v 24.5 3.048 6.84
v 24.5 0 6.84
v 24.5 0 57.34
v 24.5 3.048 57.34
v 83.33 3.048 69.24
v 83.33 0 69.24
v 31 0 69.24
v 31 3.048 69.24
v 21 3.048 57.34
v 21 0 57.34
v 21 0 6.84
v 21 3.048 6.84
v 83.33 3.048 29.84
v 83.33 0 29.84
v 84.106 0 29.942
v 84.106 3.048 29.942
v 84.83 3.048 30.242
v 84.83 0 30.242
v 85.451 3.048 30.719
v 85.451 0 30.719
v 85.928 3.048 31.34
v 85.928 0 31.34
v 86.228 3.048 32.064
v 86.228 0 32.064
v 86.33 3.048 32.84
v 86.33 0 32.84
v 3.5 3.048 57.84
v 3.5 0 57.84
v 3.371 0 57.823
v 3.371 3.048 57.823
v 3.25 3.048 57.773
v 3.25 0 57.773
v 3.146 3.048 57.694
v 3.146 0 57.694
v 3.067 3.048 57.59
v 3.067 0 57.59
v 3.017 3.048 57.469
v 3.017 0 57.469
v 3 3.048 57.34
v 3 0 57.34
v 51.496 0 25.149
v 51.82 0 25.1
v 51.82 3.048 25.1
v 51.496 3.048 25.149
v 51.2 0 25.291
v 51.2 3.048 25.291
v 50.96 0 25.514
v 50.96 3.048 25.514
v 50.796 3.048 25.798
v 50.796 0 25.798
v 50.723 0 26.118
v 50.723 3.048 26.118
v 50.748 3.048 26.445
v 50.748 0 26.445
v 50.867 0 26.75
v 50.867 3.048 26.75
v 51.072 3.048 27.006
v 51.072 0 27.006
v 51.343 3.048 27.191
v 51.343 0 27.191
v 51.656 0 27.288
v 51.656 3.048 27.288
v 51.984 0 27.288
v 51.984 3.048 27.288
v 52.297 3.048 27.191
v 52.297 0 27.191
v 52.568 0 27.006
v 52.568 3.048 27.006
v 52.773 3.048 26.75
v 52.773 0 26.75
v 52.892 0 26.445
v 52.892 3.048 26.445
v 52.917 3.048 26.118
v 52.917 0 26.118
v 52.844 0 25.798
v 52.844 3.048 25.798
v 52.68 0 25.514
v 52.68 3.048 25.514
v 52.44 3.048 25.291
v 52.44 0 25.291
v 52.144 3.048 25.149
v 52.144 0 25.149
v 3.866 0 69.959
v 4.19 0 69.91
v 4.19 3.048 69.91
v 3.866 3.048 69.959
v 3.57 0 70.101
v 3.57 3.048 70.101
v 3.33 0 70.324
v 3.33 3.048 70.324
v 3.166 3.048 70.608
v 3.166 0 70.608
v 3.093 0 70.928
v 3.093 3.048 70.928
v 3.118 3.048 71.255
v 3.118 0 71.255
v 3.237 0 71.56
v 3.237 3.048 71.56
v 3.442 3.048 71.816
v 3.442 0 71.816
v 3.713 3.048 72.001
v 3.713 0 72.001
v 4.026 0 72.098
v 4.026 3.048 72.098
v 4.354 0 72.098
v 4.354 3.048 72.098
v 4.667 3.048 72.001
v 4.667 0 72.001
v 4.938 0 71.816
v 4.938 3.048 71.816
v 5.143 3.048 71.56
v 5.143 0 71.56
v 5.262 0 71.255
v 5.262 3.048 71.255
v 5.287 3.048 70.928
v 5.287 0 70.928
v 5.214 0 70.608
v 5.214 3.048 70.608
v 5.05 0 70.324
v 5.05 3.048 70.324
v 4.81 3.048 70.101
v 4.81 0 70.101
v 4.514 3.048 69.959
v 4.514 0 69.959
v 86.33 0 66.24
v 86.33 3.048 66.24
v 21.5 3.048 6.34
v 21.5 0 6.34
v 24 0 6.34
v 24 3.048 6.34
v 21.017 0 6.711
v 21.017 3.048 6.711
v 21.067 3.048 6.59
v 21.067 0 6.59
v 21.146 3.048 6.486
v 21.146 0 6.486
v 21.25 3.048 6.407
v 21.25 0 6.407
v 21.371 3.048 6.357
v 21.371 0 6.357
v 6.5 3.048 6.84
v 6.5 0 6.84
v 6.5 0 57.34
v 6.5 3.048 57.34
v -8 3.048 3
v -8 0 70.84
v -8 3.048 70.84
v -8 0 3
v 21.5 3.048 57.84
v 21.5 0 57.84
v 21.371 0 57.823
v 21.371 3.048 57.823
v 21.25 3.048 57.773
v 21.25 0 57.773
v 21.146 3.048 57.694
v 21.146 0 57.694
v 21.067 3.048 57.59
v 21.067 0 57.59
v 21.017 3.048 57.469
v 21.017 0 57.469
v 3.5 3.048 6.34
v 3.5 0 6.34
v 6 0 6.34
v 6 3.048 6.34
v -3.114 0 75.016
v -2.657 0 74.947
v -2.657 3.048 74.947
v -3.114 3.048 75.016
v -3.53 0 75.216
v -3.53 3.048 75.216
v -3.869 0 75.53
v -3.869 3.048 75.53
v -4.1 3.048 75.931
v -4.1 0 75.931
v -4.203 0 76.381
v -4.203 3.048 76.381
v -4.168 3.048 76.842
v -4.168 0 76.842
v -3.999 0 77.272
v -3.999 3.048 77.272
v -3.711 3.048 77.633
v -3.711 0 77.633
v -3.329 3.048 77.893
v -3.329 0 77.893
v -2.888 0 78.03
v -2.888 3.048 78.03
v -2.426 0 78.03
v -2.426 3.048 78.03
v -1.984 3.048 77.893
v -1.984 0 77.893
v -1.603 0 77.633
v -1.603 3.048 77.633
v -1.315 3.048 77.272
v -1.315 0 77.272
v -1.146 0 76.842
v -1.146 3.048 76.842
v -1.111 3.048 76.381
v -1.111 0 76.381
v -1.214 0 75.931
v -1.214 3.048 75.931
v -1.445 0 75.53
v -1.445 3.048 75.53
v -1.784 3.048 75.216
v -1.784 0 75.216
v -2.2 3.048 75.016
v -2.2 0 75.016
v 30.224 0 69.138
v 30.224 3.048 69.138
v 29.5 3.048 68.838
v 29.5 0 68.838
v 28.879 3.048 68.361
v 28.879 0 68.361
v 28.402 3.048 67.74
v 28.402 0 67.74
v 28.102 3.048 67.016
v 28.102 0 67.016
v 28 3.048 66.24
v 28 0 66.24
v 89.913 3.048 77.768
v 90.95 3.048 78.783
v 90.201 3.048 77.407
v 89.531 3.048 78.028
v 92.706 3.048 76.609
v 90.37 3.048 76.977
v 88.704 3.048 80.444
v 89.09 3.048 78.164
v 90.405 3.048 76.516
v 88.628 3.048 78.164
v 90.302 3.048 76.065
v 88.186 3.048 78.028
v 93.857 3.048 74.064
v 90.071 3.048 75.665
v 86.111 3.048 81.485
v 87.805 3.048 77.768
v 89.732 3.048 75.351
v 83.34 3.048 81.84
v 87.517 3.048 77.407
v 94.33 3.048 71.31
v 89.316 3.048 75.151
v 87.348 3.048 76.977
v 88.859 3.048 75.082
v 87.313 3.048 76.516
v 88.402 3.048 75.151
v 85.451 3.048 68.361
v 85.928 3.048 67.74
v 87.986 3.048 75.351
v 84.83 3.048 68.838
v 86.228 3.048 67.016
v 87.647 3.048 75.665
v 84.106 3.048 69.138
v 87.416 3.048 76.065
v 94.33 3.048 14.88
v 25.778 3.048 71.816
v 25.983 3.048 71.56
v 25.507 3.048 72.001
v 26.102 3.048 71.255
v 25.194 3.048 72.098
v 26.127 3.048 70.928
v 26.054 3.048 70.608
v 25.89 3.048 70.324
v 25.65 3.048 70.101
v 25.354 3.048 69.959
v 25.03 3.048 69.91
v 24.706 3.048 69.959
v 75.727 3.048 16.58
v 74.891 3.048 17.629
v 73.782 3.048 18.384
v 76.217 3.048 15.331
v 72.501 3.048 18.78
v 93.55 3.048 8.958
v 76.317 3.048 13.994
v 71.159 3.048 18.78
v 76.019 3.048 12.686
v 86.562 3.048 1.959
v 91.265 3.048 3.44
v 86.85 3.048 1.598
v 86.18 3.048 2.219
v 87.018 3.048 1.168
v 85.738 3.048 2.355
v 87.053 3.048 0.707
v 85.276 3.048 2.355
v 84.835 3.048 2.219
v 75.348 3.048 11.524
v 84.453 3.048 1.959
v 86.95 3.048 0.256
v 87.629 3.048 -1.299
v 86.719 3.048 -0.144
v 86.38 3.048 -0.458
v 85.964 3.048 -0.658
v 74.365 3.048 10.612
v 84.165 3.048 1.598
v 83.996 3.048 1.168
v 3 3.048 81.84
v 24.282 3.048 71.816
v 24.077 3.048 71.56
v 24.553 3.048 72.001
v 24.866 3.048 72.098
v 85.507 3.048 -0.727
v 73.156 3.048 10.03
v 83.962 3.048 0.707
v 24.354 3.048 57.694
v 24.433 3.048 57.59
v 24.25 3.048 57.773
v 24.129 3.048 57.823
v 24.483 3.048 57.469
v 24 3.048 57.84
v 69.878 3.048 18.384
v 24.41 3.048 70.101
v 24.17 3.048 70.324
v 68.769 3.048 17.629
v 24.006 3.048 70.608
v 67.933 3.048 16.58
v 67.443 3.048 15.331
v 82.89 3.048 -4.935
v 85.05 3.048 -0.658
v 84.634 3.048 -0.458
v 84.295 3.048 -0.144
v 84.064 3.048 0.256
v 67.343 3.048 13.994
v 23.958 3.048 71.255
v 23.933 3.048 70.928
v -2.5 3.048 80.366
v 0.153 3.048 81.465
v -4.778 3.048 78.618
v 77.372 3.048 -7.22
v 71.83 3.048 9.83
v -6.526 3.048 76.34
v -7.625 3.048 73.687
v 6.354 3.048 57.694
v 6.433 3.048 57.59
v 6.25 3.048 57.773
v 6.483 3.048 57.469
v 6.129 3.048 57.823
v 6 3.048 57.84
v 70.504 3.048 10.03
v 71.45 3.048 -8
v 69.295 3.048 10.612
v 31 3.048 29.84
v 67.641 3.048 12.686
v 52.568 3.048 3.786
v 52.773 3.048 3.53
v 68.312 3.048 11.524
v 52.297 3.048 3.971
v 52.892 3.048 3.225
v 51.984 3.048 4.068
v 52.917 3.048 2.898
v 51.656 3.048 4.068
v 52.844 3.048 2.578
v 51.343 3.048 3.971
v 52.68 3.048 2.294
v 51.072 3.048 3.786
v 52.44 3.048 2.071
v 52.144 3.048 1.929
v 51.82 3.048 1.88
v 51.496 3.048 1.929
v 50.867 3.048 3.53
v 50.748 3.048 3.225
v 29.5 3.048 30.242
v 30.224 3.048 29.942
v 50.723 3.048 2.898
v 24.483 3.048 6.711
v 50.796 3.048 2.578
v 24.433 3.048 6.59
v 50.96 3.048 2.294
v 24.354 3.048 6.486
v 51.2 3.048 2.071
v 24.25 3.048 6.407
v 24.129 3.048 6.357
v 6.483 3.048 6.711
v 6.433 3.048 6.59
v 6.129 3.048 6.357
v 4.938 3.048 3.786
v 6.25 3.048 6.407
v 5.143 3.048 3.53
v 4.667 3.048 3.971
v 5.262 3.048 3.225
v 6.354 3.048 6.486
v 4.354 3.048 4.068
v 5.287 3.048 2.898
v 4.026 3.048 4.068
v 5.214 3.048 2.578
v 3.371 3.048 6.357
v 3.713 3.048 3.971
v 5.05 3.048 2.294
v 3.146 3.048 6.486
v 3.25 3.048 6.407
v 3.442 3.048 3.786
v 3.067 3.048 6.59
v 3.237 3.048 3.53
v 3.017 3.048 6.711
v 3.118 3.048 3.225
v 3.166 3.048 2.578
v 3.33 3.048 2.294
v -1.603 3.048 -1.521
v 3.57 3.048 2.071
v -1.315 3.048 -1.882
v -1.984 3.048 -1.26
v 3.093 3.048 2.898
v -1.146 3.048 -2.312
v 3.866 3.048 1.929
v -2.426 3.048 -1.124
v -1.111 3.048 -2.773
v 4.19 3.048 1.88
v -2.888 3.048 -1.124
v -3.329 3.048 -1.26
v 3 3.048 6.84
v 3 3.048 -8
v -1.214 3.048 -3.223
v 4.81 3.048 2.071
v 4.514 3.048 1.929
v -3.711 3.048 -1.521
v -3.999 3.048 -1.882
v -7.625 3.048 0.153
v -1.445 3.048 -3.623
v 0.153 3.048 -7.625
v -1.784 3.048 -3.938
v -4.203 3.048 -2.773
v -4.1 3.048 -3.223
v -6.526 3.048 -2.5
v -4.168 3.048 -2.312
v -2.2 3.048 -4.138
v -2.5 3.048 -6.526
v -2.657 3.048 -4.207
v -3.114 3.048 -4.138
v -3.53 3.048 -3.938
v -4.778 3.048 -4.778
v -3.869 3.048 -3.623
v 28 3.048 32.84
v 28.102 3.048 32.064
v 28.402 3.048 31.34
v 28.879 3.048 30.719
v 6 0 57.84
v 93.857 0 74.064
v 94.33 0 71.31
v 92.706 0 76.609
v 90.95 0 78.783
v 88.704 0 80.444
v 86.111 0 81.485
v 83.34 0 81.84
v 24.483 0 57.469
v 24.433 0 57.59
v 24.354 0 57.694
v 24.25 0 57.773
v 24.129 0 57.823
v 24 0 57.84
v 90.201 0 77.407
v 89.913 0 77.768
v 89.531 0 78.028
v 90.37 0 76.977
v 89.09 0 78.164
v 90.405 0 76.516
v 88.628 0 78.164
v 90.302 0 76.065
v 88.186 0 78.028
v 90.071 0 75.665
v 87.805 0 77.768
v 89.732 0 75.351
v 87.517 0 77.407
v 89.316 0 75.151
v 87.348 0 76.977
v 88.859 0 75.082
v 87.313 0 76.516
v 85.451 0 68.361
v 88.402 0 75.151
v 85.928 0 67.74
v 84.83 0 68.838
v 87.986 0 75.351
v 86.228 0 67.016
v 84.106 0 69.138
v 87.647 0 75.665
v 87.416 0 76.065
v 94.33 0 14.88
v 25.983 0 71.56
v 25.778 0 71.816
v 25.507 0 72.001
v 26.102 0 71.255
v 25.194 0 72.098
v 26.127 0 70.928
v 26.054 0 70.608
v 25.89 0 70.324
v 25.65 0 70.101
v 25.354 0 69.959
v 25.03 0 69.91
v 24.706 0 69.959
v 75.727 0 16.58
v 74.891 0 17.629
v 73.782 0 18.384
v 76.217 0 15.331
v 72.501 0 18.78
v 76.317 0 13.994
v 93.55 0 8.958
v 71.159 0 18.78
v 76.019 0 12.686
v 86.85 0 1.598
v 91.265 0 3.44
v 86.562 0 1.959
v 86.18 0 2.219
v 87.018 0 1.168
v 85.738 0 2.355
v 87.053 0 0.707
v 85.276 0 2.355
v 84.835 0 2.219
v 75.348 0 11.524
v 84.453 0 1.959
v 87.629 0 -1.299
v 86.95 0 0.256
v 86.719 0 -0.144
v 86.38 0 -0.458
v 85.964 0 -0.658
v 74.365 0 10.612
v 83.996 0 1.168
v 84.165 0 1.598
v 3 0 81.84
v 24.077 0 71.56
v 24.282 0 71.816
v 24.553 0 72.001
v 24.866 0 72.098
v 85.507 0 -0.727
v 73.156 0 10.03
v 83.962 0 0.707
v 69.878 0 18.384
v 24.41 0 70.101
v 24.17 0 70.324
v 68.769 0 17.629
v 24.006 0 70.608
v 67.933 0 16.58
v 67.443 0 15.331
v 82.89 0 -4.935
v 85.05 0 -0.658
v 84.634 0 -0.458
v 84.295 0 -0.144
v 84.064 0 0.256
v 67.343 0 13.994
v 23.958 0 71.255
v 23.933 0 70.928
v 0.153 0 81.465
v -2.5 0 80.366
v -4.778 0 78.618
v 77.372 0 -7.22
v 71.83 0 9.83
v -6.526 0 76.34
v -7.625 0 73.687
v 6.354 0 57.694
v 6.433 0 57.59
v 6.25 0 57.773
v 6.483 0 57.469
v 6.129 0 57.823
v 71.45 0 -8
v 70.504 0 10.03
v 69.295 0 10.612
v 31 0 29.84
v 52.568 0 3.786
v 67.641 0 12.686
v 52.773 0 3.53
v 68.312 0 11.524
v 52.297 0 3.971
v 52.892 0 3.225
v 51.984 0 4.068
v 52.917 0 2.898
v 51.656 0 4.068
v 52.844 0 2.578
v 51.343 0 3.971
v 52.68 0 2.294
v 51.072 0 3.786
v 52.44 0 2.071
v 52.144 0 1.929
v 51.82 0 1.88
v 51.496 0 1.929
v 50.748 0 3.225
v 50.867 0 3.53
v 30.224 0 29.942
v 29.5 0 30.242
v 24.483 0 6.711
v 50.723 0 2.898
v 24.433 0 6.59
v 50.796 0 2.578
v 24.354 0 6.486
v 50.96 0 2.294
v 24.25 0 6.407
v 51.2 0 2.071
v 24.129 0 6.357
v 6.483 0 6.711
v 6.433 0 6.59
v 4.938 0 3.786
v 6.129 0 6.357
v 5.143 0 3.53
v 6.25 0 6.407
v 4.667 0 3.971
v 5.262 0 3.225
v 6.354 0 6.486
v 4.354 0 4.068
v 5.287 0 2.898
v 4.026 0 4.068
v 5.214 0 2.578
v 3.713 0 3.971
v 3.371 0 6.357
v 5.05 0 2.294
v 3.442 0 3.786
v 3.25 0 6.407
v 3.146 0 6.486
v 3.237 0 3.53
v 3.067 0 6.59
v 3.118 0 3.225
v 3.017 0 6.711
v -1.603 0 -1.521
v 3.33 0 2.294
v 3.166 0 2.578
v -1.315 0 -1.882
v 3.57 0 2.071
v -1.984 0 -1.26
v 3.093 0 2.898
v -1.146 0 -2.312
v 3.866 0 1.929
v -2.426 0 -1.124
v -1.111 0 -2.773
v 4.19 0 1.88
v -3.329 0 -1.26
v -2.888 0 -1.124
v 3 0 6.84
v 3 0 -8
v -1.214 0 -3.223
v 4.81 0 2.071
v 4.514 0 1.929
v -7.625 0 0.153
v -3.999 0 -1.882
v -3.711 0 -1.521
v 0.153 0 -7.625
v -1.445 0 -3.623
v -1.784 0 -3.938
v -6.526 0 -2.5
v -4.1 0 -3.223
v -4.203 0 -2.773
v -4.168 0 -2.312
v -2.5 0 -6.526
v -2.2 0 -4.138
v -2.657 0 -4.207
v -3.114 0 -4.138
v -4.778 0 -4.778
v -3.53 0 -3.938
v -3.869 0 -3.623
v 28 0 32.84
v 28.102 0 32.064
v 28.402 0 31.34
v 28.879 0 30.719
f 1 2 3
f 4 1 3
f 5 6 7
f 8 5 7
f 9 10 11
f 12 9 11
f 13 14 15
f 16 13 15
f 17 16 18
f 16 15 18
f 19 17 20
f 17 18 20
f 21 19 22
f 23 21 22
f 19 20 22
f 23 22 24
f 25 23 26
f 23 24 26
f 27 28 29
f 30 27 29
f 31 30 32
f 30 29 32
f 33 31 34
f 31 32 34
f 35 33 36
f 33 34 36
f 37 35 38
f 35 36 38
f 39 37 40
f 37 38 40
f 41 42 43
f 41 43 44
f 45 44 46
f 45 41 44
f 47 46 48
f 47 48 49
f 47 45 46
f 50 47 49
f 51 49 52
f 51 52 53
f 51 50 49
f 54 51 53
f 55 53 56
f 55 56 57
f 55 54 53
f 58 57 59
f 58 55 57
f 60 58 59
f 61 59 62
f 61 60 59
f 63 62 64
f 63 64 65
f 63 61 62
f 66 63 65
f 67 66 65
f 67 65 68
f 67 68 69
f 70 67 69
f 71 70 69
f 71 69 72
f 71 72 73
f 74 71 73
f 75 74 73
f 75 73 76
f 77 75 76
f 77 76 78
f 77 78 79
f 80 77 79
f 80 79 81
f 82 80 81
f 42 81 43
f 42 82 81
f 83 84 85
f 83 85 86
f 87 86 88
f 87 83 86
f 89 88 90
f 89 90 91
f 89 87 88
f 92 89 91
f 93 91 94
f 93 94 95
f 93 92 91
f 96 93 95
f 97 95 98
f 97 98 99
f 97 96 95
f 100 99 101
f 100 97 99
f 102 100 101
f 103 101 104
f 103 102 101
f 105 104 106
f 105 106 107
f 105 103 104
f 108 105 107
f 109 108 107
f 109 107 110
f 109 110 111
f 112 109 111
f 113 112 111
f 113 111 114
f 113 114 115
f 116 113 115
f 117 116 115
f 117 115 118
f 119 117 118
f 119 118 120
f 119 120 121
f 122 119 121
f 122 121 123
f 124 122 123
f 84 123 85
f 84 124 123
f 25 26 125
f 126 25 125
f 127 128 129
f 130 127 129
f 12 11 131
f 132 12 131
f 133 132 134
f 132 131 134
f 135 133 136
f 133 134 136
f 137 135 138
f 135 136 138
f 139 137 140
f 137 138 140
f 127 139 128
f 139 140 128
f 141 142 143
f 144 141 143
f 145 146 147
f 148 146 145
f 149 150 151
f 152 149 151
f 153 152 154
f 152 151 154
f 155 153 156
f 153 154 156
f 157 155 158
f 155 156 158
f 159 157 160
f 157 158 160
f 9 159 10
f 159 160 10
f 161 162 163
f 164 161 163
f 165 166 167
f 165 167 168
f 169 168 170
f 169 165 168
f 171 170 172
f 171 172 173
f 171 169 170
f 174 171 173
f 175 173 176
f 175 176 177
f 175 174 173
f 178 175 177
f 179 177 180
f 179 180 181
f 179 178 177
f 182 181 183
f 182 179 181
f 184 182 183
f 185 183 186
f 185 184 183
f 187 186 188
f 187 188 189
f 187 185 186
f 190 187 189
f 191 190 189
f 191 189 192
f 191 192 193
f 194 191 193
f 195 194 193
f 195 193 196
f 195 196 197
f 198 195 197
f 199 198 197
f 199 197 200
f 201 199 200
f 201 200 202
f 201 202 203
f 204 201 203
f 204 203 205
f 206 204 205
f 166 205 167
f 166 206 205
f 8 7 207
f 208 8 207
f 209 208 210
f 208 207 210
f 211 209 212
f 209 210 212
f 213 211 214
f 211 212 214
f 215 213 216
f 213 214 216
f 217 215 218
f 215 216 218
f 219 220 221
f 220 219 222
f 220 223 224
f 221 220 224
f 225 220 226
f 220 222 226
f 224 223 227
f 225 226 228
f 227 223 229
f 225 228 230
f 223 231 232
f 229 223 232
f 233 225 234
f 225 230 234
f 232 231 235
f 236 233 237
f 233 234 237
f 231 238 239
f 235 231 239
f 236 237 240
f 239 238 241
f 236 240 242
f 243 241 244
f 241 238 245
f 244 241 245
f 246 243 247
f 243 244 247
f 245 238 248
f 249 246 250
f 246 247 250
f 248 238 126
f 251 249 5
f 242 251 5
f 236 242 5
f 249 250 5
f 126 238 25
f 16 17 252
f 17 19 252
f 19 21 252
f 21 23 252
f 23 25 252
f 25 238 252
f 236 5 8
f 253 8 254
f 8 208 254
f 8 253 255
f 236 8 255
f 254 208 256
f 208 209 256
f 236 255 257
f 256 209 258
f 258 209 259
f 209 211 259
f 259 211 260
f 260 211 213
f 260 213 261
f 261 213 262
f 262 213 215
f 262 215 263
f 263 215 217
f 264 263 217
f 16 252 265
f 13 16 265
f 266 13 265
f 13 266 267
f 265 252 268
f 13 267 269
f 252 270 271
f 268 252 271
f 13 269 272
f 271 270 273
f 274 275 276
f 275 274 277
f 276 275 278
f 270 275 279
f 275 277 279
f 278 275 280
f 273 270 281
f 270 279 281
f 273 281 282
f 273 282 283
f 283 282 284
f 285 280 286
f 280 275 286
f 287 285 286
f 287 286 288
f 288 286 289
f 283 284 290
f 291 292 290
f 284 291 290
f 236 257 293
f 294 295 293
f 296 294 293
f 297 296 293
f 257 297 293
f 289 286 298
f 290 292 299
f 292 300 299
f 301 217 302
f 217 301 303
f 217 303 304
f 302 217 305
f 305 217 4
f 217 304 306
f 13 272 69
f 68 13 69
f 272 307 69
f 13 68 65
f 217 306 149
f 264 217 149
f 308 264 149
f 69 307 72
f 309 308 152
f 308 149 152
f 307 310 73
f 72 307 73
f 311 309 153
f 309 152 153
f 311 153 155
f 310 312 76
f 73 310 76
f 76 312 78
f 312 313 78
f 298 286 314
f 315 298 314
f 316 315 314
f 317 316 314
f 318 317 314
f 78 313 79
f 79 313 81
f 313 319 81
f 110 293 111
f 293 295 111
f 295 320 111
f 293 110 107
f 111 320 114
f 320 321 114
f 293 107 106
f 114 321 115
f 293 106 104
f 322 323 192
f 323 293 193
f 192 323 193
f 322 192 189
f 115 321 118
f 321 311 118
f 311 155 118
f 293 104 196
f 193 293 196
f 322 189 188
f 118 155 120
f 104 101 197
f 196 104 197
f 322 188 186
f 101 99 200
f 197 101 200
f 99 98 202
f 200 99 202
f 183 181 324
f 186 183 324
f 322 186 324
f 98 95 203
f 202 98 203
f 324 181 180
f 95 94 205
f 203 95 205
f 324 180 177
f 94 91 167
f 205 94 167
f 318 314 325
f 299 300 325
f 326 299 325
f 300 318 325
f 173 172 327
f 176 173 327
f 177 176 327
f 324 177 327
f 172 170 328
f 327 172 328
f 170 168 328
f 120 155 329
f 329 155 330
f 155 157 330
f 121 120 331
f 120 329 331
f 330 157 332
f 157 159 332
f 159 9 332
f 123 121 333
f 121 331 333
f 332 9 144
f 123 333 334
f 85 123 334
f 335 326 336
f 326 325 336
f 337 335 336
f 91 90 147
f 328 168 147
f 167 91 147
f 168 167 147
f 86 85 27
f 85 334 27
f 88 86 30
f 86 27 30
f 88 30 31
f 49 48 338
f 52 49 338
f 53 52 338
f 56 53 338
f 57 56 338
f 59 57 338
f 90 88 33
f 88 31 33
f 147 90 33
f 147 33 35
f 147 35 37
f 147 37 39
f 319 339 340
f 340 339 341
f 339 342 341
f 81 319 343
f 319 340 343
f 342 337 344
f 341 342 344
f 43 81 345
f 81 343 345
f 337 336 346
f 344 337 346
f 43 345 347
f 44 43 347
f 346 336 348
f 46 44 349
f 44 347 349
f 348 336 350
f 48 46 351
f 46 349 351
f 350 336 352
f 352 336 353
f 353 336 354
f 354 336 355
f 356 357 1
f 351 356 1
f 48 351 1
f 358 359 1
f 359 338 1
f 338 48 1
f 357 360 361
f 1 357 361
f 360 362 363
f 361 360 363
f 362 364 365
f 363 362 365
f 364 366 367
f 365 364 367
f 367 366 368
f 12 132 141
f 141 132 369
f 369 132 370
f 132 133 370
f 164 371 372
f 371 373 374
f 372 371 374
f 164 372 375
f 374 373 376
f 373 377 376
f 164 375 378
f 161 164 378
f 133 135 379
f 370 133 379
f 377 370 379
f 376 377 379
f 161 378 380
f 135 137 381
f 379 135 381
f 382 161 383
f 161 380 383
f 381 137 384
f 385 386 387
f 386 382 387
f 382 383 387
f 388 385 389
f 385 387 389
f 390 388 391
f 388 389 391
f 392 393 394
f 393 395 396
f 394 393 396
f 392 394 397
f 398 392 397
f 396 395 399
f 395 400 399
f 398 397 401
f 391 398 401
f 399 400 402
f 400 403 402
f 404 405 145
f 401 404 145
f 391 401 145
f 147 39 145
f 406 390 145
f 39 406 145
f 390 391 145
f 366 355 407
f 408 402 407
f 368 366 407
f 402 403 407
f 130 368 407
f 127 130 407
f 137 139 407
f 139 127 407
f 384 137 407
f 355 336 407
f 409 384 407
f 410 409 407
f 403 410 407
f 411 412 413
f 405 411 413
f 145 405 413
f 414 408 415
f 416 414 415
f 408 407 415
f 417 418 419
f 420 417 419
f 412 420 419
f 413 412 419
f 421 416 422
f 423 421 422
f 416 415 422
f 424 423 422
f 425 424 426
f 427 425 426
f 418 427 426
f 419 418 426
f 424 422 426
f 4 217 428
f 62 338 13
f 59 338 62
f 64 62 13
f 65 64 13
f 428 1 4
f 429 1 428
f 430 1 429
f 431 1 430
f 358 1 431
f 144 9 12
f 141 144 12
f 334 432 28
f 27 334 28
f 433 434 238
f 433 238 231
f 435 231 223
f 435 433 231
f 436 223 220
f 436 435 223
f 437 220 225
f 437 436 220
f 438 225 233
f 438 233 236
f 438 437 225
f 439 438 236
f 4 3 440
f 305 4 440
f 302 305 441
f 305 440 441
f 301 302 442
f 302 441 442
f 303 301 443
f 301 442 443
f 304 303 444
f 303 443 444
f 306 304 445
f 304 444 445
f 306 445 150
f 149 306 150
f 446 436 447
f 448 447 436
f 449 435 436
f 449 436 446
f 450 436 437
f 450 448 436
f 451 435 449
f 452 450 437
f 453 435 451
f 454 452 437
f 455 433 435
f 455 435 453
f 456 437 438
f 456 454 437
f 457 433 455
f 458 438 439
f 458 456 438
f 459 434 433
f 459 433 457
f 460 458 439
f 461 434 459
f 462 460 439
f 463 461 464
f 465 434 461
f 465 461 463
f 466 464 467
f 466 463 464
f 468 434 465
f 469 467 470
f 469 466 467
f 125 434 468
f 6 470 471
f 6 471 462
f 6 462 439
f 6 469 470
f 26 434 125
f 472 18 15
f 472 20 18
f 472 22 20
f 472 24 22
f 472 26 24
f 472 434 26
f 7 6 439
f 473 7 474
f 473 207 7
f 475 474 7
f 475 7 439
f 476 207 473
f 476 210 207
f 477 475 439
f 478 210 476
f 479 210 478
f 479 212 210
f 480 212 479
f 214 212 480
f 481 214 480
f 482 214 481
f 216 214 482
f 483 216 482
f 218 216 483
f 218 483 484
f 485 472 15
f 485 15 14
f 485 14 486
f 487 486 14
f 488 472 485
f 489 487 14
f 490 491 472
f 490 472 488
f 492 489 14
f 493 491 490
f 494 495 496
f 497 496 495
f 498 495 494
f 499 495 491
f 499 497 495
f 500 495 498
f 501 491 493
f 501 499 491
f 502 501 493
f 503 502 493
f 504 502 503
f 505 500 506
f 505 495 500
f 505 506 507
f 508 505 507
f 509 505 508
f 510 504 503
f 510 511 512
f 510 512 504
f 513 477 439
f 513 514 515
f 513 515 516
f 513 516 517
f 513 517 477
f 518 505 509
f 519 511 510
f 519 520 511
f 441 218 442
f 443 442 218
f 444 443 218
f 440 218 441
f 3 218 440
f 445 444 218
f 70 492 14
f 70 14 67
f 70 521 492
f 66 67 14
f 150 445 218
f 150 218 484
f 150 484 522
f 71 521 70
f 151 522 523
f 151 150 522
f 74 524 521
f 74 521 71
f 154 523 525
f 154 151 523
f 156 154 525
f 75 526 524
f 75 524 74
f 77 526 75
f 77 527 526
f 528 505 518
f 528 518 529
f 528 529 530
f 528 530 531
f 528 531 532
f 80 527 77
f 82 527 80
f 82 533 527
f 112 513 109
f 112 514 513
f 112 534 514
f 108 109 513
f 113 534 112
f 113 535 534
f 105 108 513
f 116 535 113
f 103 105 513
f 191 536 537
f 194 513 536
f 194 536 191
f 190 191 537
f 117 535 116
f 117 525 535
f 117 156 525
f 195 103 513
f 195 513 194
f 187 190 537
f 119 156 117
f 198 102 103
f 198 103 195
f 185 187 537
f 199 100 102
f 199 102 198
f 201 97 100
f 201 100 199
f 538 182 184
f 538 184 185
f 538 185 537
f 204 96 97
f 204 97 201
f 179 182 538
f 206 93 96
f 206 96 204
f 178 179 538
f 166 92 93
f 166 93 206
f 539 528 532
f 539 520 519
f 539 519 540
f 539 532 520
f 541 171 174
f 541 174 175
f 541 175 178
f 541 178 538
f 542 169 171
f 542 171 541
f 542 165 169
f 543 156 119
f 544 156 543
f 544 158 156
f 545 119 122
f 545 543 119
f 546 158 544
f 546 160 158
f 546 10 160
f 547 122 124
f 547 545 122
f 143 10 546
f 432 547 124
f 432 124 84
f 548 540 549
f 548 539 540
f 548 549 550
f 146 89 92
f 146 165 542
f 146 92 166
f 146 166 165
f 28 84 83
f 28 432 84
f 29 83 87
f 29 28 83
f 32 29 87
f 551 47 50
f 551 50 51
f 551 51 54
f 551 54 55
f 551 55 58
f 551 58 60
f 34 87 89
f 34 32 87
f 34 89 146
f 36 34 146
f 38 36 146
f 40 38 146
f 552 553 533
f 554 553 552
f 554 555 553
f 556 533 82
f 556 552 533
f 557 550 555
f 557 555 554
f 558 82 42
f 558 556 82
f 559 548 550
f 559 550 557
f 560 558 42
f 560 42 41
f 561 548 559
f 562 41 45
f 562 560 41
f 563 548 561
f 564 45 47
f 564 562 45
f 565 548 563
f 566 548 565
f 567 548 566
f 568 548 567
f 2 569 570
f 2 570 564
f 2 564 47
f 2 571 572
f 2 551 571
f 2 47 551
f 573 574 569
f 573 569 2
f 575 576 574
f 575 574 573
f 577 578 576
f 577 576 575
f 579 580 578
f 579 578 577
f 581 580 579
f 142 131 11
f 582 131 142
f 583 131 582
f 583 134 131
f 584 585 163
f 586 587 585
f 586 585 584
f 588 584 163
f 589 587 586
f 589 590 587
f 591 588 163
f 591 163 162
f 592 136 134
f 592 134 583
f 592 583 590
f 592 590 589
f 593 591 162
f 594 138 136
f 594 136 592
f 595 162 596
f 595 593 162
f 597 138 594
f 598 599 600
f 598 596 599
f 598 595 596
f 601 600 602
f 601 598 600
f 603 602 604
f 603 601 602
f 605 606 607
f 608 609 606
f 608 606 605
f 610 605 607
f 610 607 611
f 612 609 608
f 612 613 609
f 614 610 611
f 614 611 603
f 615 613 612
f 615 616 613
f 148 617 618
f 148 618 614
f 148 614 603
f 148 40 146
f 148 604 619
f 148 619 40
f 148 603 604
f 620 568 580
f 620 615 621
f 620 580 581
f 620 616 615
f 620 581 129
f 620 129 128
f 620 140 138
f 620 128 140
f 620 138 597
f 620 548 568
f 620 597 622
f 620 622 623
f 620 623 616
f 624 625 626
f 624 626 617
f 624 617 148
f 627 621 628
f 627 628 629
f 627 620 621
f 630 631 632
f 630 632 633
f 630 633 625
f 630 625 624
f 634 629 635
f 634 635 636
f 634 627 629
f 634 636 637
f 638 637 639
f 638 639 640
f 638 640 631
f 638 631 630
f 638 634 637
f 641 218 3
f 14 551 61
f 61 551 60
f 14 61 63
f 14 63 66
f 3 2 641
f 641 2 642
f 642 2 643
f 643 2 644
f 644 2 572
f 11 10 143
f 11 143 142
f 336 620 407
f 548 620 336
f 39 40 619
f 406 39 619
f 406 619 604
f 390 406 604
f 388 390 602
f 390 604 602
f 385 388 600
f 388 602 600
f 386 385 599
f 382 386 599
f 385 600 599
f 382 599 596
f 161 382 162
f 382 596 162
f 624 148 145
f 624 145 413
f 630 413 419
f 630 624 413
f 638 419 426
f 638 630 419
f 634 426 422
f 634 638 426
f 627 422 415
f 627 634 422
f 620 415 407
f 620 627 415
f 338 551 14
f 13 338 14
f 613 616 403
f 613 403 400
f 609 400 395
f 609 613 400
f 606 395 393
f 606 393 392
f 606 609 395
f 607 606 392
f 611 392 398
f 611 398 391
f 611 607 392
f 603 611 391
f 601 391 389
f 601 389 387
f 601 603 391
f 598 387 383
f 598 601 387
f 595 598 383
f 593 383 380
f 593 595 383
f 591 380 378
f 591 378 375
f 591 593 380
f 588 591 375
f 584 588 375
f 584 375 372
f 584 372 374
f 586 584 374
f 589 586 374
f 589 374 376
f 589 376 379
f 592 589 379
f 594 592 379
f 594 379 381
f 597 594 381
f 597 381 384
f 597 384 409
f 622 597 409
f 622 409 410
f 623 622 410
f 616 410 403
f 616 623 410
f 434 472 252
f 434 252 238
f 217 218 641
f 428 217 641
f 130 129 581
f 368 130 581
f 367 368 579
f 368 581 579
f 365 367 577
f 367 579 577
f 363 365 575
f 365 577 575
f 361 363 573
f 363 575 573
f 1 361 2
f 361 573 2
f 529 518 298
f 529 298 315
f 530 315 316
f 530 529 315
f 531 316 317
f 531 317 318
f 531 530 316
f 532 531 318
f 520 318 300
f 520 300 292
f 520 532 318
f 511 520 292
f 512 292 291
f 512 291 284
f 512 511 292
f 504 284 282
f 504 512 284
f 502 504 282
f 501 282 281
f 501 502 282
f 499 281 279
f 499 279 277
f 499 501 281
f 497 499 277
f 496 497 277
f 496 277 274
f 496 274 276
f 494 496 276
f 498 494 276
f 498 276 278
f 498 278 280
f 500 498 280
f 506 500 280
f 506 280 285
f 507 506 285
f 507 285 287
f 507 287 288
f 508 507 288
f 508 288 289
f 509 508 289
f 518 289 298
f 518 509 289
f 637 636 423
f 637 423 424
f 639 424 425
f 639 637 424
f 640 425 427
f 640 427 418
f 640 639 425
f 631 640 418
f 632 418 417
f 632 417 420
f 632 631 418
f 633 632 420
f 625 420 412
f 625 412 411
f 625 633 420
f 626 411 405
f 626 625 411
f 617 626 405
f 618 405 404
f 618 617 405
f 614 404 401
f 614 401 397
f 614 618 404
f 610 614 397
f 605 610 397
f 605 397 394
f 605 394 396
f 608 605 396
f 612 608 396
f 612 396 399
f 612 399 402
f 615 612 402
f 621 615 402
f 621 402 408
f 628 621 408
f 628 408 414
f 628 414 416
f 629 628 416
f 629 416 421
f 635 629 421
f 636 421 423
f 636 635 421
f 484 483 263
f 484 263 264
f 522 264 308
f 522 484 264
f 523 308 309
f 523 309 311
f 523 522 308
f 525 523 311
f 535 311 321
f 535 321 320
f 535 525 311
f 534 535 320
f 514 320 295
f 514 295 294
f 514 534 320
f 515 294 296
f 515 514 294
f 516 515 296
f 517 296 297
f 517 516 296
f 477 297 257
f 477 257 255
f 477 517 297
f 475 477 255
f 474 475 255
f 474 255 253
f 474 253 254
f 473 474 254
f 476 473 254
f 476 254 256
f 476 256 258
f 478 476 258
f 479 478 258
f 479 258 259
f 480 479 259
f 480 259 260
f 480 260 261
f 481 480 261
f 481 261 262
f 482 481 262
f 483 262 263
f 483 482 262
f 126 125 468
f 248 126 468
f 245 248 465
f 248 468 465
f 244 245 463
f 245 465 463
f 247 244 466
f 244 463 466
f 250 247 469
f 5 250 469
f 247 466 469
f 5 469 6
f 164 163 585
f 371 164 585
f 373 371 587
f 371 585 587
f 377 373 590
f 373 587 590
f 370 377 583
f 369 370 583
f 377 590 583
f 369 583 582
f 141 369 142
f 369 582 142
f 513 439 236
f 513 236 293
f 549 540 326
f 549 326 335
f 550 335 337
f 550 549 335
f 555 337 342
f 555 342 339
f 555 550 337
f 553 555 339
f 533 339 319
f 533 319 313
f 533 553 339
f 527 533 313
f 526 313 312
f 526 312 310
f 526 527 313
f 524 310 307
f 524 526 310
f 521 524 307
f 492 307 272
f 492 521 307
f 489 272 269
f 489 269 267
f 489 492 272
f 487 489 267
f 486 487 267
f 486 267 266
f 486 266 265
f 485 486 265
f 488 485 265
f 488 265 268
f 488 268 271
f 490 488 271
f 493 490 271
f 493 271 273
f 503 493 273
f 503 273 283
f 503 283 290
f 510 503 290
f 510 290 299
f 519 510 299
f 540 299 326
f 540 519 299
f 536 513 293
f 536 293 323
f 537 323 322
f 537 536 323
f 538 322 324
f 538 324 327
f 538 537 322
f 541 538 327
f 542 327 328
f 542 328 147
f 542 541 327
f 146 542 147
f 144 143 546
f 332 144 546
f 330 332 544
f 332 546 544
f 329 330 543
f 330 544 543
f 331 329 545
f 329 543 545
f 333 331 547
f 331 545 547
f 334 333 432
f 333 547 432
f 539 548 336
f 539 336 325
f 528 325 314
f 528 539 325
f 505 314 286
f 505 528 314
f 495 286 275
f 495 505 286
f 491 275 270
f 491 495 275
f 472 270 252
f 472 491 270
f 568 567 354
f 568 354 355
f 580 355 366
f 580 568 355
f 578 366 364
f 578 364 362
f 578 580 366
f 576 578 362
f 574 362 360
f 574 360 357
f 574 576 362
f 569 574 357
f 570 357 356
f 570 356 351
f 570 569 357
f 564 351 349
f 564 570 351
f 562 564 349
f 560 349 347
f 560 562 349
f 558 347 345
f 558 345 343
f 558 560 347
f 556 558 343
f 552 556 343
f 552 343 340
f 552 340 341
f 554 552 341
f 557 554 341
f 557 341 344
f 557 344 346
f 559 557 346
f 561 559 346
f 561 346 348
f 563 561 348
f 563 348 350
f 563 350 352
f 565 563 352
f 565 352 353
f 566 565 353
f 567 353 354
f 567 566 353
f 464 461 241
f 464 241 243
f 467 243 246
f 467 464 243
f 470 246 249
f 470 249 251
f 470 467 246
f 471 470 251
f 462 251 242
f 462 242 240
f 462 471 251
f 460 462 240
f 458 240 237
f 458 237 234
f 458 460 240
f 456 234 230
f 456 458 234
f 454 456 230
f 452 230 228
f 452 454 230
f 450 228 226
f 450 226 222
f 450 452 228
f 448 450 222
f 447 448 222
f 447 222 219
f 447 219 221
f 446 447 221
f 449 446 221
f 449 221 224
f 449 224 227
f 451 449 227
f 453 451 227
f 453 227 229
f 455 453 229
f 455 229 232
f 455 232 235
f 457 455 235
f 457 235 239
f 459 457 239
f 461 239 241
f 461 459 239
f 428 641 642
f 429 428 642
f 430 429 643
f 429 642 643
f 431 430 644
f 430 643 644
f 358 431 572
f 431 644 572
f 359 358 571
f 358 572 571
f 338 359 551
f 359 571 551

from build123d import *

# Parameters (mm, degrees)
SKETCH2_R           = 1.1
SKETCH2_R_2         = 4.5
SKETCH2_R_3         = 1.55
BOSS_EXTRUDE1_DEPTH = 3.048


with BuildPart() as part:
    # Sketch2 → Boss-Extrude1 (new body)
    with BuildSketch(Plane(origin=(0, 0, 0), x_dir=(1, 0, 0), z_dir=(0, 1, 0))):
        with BuildLine():
            Line((3, 8), (71.45, 8))
            ThreePointArc((71.45, 8), (87.628603154, 1.298603154), (94.33, -14.88))
            Line((94.33, -14.88), (94.33, -71.310147445))
            ThreePointArc((94.33, -71.310147445), (90.950189058, -78.782657675), (83.340051803, -81.84))
            Line((83.340051803, -81.84), (3, -81.84))
            ThreePointArc((3, -81.84), (-4.778174593, -78.618174593), (-8, -70.84))
            Line((-8, -70.84), (-8, -3))
            ThreePointArc((-8, -3), (-4.778174593, 4.778174593), (3, 8))
        make_face()
        with Locations(Location((4.19, -71.01, 0), (0, 0, 90))):
            Circle(SKETCH2_R, mode=Mode.SUBTRACT)
        with Locations(Location((25.03, -71.01, 0), (0, 0, 90))):
            Circle(SKETCH2_R, mode=Mode.SUBTRACT)
        with Locations(Location((4.19, -2.98, 0), (0, 0, 90))):
            Circle(SKETCH2_R, mode=Mode.SUBTRACT)
        with Locations(Location((51.82, -2.98, 0), (0, 0, 90))):
            Circle(SKETCH2_R, mode=Mode.SUBTRACT)
        with Locations(Location((51.82, -26.2, 0), (0, 0, 90))):
            Circle(SKETCH2_R, mode=Mode.SUBTRACT)
        with Locations(Location((71.83, -14.33, 0), (0, 0, 90))):
            Circle(SKETCH2_R_2, mode=Mode.SUBTRACT)
        with Locations(Location((-2.656854249, 2.656854249, 0), (0, 0, 90))):
            Circle(SKETCH2_R_3, mode=Mode.SUBTRACT)
        with Locations(Location((85.50728281, -0.82271719, 0), (0, 0, 90))):
            Circle(SKETCH2_R_3, mode=Mode.SUBTRACT)
        with Locations(Location((88.858862501, -76.631761762, 0), (0, 0, 90))):
            Circle(SKETCH2_R_3, mode=Mode.SUBTRACT)
        with Locations(Location((-2.656854249, -76.496854249, 0), (0, 0, 90))):
            Circle(SKETCH2_R_3, mode=Mode.SUBTRACT)
        with BuildLine():
            Line((28, -66.24), (28, -32.84))
            ThreePointArc((28, -32.84), (28.878679656, -30.718679656), (31, -29.84))
            Line((31, -29.84), (83.33, -29.84))
            ThreePointArc((83.33, -29.84), (85.451320344, -30.718679656), (86.33, -32.84))
            Line((86.33, -32.84), (86.33, -66.24))
            ThreePointArc((86.33, -66.24), (85.451320344, -68.361320344), (83.33, -69.24))
            Line((83.33, -69.24), (31, -69.24))
            ThreePointArc((31, -69.24), (28.878679656, -68.361320344), (28, -66.24))
        make_face(mode=Mode.SUBTRACT)
        with BuildLine():
            Line((6.5, -6.84), (6.5, -57.34))
            ThreePointArc((6.5, -57.34), (6.353553391, -57.693553391), (6, -57.84))
            Line((6, -57.84), (3.5, -57.84))
            ThreePointArc((3.5, -57.84), (3.146446609, -57.693553391), (3, -57.34))
            Line((3, -57.34), (3, -6.84))
            ThreePointArc((3, -6.84), (3.146446609, -6.486446609), (3.5, -6.34))
            Line((3.5, -6.34), (6, -6.34))
            ThreePointArc((6, -6.34), (6.353553391, -6.486446609), (6.5, -6.84))
        make_face(mode=Mode.SUBTRACT)
        with BuildLine():
            Line((24.5, -6.84), (24.5, -57.34))
            ThreePointArc((24.5, -57.34), (24.353553391, -57.693553391), (24, -57.84))
            Line((24, -57.84), (21.5, -57.84))
            ThreePointArc((21.5, -57.84), (21.146446609, -57.693553391), (21, -57.34))
            Line((21, -57.34), (21, -6.84))
            ThreePointArc((21, -6.84), (21.146446609, -6.486446609), (21.5, -6.34))
            Line((21.5, -6.34), (24, -6.34))
            ThreePointArc((24, -6.34), (24.353553391, -6.486446609), (24.5, -6.84))
        make_face(mode=Mode.SUBTRACT)
    extrude(amount=BOSS_EXTRUDE1_DEPTH)


solid = part.part
